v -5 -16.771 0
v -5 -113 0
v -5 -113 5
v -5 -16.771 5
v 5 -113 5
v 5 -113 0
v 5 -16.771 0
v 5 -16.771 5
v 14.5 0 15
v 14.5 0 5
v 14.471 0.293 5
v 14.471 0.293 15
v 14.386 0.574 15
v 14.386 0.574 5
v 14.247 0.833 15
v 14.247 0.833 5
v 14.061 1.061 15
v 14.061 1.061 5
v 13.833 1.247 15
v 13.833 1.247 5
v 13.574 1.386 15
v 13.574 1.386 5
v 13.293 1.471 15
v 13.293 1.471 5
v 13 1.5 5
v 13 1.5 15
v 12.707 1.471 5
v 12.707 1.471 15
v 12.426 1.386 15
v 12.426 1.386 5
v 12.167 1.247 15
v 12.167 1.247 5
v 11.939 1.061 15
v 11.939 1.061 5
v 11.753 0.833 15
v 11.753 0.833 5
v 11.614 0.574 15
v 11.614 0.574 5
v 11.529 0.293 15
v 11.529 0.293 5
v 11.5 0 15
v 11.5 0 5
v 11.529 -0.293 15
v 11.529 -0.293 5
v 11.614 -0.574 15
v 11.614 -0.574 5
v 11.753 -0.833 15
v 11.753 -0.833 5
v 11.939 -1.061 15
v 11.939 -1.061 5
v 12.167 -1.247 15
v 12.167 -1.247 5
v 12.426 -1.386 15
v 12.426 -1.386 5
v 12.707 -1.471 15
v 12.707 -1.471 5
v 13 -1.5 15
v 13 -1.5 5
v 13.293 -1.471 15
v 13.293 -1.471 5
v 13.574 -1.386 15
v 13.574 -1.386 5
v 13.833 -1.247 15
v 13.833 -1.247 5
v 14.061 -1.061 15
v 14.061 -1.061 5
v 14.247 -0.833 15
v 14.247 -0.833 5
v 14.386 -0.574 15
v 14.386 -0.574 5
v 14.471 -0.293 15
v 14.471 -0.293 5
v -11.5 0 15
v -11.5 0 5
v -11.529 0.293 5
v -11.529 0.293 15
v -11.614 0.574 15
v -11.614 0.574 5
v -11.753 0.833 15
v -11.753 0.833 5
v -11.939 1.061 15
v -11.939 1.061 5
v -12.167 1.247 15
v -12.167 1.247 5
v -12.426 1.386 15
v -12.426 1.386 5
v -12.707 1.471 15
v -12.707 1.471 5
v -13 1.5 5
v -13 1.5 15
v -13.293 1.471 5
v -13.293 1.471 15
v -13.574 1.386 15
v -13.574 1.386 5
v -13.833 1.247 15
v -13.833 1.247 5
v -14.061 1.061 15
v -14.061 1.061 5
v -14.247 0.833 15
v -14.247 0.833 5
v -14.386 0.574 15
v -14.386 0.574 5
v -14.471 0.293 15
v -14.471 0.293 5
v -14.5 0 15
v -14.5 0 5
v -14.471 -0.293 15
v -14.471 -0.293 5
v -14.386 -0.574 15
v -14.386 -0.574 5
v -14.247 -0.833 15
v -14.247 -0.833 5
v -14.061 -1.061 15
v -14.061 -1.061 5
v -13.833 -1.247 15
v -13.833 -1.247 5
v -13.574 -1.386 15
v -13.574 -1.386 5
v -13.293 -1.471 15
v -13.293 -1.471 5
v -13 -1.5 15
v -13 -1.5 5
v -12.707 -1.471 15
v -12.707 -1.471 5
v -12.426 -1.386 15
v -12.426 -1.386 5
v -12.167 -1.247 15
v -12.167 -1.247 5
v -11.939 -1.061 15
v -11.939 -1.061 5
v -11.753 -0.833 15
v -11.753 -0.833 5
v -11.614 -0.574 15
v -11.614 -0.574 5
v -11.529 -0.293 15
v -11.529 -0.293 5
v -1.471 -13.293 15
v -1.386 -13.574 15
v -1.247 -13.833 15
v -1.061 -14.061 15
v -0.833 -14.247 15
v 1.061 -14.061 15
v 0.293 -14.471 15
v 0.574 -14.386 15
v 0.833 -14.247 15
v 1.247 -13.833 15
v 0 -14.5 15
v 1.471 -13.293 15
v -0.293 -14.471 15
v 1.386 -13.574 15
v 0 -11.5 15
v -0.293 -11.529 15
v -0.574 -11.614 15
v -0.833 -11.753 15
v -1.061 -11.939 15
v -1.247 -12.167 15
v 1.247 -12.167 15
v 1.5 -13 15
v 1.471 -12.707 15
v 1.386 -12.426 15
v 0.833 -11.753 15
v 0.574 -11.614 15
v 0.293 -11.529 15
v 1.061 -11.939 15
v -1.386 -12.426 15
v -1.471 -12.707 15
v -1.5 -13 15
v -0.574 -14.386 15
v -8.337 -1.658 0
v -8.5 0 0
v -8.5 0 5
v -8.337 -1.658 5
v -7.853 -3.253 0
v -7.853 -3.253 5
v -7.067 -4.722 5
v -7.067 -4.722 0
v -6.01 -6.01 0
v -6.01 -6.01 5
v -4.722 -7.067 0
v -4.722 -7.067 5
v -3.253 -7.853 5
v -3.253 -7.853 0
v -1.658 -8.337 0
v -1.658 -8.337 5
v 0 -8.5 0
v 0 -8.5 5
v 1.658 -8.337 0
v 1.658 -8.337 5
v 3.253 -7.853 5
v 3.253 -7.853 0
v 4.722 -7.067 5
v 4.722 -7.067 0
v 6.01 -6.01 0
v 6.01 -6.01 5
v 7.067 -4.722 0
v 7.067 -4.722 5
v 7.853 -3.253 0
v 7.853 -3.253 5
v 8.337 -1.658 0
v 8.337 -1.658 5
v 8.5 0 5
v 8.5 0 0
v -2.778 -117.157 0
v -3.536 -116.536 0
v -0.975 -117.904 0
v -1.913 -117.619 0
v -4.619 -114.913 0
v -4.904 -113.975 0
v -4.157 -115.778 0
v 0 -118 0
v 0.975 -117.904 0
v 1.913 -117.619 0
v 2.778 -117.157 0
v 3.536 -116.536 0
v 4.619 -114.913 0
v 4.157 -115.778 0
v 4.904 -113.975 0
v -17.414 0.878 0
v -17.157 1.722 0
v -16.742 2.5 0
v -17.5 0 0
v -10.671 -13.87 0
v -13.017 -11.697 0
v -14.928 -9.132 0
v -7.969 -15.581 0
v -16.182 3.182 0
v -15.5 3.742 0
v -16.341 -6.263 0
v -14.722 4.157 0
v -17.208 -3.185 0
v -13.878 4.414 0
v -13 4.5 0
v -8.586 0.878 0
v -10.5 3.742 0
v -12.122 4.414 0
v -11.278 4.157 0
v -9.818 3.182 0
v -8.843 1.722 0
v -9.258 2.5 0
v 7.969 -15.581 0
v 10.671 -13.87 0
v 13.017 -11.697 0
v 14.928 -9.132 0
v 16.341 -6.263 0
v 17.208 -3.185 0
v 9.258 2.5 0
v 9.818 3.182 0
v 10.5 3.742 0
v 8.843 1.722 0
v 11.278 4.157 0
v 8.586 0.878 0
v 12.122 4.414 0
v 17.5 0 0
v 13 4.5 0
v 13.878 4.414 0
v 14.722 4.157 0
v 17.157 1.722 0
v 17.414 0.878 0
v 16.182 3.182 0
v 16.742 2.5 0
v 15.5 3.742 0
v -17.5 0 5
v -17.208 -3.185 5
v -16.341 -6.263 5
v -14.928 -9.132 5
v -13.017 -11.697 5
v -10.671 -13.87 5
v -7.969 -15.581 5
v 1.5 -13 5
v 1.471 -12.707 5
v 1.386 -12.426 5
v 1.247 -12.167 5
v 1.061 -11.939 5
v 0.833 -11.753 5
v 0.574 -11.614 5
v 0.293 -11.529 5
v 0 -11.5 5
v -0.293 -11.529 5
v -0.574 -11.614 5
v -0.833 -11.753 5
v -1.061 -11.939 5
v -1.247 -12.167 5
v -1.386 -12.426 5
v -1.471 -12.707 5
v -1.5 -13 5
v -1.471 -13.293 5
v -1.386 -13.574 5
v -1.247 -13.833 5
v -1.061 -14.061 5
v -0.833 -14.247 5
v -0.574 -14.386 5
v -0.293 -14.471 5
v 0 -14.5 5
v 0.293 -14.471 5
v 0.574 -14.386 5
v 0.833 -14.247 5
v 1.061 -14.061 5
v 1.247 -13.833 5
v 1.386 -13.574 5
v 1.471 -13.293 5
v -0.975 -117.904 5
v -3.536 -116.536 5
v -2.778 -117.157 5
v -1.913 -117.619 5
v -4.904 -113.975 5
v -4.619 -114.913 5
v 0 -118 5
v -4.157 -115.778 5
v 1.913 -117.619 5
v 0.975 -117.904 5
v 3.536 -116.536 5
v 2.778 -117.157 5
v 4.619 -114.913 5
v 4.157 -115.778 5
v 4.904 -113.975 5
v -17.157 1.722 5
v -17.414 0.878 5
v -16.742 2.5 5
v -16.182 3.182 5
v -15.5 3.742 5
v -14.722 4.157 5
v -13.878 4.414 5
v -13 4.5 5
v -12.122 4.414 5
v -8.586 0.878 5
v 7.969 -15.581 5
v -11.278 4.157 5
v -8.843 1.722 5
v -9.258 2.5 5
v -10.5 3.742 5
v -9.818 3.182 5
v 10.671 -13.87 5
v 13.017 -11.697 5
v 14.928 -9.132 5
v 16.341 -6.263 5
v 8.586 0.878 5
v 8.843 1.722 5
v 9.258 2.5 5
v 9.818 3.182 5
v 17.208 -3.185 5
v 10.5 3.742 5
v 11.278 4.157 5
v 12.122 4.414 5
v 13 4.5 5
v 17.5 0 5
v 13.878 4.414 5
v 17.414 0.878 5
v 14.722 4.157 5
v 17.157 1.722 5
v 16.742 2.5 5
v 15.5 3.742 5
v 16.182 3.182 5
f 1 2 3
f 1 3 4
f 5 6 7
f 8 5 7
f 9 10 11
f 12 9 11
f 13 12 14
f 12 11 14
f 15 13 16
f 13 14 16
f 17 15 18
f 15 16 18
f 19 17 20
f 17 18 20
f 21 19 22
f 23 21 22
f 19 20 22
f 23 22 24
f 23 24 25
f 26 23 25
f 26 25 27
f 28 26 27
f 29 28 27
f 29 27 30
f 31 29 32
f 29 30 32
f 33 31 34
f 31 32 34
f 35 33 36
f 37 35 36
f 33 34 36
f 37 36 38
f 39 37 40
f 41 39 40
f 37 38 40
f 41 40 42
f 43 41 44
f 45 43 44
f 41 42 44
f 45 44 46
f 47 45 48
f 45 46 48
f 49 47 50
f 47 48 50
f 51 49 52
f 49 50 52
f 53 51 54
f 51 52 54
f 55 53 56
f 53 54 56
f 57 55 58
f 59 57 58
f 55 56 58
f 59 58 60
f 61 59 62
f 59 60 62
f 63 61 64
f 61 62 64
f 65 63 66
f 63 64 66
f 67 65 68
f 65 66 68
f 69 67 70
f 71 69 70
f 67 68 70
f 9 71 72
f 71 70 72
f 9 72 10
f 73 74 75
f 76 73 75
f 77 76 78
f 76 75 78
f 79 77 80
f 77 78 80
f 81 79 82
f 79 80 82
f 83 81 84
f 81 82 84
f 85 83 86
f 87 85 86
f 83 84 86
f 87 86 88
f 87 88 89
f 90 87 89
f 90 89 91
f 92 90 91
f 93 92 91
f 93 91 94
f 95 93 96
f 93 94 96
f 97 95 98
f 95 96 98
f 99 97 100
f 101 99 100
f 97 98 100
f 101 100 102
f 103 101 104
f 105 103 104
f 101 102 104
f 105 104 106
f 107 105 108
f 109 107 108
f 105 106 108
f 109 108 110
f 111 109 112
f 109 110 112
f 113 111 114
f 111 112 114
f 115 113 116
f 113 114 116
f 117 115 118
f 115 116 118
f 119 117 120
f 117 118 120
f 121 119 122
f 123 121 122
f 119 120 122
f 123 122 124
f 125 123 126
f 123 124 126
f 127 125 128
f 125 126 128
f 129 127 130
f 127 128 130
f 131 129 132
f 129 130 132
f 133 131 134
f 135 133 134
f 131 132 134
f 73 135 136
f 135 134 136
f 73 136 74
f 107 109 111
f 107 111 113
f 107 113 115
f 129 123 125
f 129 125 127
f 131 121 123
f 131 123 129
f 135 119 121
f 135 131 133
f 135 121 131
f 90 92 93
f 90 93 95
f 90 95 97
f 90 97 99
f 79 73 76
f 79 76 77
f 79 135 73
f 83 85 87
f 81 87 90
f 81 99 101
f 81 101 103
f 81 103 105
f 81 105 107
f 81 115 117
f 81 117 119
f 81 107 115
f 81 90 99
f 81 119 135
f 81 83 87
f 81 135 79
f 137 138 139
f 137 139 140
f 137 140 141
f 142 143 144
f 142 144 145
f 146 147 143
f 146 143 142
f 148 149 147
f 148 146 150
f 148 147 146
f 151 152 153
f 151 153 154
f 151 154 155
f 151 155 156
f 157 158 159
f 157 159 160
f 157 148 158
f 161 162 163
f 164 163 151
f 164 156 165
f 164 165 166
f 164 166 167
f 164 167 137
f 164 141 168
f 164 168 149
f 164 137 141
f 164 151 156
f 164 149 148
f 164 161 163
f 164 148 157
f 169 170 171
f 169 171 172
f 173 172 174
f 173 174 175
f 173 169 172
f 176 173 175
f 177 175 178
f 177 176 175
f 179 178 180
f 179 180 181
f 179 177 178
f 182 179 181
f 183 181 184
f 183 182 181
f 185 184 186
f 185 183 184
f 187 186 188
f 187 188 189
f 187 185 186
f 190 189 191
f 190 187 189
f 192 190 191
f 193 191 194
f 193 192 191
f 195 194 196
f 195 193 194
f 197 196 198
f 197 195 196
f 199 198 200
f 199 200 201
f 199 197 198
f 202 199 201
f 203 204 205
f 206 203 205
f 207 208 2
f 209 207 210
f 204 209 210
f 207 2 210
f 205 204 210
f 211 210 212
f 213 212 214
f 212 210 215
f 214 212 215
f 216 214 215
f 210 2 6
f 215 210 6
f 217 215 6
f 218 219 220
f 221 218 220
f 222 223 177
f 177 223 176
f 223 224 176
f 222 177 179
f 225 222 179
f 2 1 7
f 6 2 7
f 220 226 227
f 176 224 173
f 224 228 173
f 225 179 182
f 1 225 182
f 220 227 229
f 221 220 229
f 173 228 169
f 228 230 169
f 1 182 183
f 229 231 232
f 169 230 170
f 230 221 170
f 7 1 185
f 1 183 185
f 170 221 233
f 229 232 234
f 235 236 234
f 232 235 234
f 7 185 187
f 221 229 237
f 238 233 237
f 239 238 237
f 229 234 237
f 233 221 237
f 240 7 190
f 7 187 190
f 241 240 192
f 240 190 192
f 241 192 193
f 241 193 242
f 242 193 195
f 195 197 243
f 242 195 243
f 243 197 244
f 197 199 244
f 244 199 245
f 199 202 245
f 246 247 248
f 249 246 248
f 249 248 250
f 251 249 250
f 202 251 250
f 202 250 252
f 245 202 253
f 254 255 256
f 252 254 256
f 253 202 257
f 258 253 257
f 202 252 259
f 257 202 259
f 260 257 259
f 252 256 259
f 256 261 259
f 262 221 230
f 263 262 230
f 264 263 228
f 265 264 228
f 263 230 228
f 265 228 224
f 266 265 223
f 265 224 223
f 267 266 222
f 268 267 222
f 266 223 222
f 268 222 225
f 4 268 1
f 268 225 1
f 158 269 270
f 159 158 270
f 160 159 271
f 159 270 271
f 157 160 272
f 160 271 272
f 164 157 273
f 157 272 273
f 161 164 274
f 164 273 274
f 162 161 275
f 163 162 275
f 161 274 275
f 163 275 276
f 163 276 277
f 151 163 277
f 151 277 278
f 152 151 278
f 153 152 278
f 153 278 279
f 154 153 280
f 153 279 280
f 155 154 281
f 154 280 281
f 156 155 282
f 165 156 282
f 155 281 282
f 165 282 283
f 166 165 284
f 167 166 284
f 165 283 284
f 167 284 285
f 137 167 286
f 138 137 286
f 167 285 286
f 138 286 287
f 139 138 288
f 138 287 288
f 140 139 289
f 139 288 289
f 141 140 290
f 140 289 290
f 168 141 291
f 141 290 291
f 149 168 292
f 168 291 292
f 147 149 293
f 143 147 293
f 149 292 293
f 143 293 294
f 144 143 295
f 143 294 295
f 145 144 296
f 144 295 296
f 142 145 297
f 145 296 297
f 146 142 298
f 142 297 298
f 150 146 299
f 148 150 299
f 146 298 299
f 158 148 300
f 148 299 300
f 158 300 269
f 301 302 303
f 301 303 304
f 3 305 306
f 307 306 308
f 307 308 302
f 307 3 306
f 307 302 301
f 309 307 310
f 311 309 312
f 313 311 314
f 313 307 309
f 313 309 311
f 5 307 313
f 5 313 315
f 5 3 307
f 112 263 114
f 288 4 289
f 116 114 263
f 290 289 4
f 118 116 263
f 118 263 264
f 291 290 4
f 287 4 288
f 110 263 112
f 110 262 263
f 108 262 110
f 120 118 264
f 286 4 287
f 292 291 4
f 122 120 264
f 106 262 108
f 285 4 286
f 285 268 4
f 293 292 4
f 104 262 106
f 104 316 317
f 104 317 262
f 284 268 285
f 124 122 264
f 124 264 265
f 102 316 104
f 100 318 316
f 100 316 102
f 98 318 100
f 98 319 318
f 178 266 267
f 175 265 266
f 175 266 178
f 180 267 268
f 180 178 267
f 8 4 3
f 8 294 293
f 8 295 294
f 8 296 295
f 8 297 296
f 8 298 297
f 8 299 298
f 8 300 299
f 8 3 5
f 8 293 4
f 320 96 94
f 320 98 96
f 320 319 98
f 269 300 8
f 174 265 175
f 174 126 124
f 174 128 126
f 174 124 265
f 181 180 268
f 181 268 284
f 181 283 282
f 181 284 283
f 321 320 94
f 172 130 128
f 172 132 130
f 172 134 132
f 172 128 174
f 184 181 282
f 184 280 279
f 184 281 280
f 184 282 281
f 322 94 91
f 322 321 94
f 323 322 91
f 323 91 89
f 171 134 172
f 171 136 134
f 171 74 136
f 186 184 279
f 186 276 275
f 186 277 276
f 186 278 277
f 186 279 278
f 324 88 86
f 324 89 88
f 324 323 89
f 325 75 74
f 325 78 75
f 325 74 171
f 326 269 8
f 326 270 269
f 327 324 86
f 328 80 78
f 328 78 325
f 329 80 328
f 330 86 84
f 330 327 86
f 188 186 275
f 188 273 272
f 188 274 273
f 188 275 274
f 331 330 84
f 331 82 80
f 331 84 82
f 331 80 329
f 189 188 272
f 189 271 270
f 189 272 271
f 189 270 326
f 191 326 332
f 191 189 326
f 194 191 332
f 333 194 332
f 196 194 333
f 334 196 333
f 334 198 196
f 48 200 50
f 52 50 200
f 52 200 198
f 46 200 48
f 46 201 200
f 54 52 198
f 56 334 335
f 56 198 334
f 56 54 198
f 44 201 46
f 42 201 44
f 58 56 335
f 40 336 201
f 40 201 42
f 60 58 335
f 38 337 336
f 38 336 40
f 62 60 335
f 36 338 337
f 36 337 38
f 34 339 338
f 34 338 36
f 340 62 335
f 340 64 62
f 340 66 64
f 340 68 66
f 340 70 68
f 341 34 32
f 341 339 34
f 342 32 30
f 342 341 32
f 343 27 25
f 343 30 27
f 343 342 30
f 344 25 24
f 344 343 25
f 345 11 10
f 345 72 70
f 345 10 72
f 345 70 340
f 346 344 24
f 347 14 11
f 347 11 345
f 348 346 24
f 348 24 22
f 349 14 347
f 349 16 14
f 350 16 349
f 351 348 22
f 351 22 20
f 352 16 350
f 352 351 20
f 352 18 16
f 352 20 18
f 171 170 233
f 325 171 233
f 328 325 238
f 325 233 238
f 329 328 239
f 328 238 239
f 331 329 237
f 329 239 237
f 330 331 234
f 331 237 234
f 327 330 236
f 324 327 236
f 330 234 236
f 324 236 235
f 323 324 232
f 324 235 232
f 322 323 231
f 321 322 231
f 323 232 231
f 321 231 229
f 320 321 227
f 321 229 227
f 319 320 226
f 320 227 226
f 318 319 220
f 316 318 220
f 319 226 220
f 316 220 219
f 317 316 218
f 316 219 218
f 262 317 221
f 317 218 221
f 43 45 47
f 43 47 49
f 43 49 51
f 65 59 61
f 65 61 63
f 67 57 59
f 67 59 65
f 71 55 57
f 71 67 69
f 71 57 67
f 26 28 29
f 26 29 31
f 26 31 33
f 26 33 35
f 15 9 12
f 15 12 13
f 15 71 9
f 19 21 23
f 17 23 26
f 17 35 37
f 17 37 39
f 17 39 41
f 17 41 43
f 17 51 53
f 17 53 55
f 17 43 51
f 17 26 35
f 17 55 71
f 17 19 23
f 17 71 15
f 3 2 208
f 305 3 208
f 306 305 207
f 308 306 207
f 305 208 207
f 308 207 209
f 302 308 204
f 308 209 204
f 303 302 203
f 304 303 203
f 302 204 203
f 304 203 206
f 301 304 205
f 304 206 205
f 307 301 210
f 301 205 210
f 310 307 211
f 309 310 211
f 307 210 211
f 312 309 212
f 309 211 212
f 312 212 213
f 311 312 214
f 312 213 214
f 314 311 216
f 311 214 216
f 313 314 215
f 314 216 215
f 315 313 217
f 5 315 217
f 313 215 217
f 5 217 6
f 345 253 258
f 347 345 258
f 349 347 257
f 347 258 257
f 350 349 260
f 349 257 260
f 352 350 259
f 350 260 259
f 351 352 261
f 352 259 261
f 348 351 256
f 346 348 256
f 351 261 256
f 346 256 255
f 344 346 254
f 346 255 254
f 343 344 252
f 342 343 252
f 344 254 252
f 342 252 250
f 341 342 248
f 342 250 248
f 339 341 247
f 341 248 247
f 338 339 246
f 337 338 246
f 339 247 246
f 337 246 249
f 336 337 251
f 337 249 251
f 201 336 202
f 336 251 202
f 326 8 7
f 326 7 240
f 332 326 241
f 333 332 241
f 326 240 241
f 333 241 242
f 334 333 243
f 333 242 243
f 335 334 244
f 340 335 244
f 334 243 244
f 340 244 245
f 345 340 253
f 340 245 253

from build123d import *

# Parameters (mm, degrees)
BOX001_W          = 10
BOX001_H          = 100
BOX001_DEPTH      = 5
CYLINDER004_R     = 1.5
CYLINDER004_DEPTH = 10
CYLINDER005_R     = 1.5
CYLINDER005_DEPTH = 10
CYLINDER006_R     = 1.5
CYLINDER006_DEPTH = 10
CYLINDER007_R     = 5
CYLINDER007_DEPTH = 5
CYLINDER002_R     = 4.5
CYLINDER002_DEPTH = 5
CYLINDER003_R     = 4.5
CYLINDER003_DEPTH = 5
BOX_W             = 35
BOX_H             = 30.5
BOX_DEPTH         = 5
CYLINDER_R        = 8.5
CYLINDER_DEPTH    = 5
CYLINDER001_R     = 17.5
CYLINDER001_DEPTH = 5


with BuildPart() as cube001:
    # Box001 → Box001 (new body)
    with BuildSketch(Plane(origin=(-5, -113, 0), x_dir=(1, 0, 0), z_dir=(0, 0, 1))):
        with Locations((5, 50)):
            Rectangle(BOX001_W, BOX001_H)
    extrude(amount=BOX001_DEPTH)


with BuildPart() as cylinder004:
    # Cylinder004 → Cylinder004 (new body)
    with BuildSketch(Plane(origin=(0, -13, 5), x_dir=(1, 0, 0), z_dir=(0, 0, 1))):
        Circle(CYLINDER004_R)
    extrude(amount=CYLINDER004_DEPTH)


with BuildPart() as cylinder005:
    # Cylinder005 → Cylinder005 (new body)
    with BuildSketch(Plane(origin=(13, 0, 5), x_dir=(1, 0, 0), z_dir=(0, 0, 1))):
        Circle(CYLINDER005_R)
    extrude(amount=CYLINDER005_DEPTH)


with BuildPart() as cylinder006:
    # Cylinder006 → Cylinder006 (new body)
    with BuildSketch(Plane(origin=(-13, 0, 5), x_dir=(1, 0, 0), z_dir=(0, 0, 1))):
        Circle(CYLINDER006_R)
    extrude(amount=CYLINDER006_DEPTH)


with BuildPart() as cylinder007:
    # Cylinder007 → Cylinder007 (new body)
    with BuildSketch(Plane(origin=(0, -113, 0), x_dir=(1, 0, 0), z_dir=(0, 0, 1))):
        Circle(CYLINDER007_R)
    extrude(amount=CYLINDER007_DEPTH)


with BuildPart() as cylinder002:
    # Cylinder002 → Cylinder002 (new body)
    with BuildSketch(Plane(origin=(13, 0, 0), x_dir=(1, 0, 0), z_dir=(0, 0, 1))):
        Circle(CYLINDER002_R)
    extrude(amount=CYLINDER002_DEPTH)


with BuildPart() as cylinder003:
    # Cylinder003 → Cylinder003 (new body)
    with BuildSketch(Plane(origin=(-13, 0, 0), x_dir=(1, 0, 0), z_dir=(0, 0, 1))):
        Circle(CYLINDER003_R)
    extrude(amount=CYLINDER003_DEPTH)


with BuildPart() as cube:
    # Box → Box (new body)
    with BuildSketch(Plane(origin=(-17.5, 0, 0), x_dir=(1, 0, 0), z_dir=(0, 0, 1))):
        with Locations((17.5, 15.25)):
            Rectangle(BOX_W, BOX_H)
    extrude(amount=BOX_DEPTH)


with BuildPart() as cylinder:
    # Cylinder → Cylinder (new body)
    with BuildSketch(Plane.XY):
        Circle(CYLINDER_R)
    extrude(amount=CYLINDER_DEPTH)


with BuildPart() as xl30wehneltwrench:
    # Cylinder001 → Cylinder001 (new body)
    with BuildSketch(Plane.XY):
        Circle(CYLINDER001_R)
    extrude(amount=CYLINDER001_DEPTH)

    # Cut: cut Cylinder
    add(cylinder.part, mode=Mode.SUBTRACT)

    # Cut001: cut Cube
    add(cube.part, mode=Mode.SUBTRACT)

    # Fusion: union Cylinder002, Cylinder003
    add(cylinder002.part)
    add(cylinder003.part)

    # Fusion001: union Cube001, Cylinder004, Cylinder005, Cylinder006, Cylinder007
    add(cube001.part)
    add(cylinder004.part)
    add(cylinder005.part)
    add(cylinder006.part)
    add(cylinder007.part)


solid = xl30wehneltwrench.part
